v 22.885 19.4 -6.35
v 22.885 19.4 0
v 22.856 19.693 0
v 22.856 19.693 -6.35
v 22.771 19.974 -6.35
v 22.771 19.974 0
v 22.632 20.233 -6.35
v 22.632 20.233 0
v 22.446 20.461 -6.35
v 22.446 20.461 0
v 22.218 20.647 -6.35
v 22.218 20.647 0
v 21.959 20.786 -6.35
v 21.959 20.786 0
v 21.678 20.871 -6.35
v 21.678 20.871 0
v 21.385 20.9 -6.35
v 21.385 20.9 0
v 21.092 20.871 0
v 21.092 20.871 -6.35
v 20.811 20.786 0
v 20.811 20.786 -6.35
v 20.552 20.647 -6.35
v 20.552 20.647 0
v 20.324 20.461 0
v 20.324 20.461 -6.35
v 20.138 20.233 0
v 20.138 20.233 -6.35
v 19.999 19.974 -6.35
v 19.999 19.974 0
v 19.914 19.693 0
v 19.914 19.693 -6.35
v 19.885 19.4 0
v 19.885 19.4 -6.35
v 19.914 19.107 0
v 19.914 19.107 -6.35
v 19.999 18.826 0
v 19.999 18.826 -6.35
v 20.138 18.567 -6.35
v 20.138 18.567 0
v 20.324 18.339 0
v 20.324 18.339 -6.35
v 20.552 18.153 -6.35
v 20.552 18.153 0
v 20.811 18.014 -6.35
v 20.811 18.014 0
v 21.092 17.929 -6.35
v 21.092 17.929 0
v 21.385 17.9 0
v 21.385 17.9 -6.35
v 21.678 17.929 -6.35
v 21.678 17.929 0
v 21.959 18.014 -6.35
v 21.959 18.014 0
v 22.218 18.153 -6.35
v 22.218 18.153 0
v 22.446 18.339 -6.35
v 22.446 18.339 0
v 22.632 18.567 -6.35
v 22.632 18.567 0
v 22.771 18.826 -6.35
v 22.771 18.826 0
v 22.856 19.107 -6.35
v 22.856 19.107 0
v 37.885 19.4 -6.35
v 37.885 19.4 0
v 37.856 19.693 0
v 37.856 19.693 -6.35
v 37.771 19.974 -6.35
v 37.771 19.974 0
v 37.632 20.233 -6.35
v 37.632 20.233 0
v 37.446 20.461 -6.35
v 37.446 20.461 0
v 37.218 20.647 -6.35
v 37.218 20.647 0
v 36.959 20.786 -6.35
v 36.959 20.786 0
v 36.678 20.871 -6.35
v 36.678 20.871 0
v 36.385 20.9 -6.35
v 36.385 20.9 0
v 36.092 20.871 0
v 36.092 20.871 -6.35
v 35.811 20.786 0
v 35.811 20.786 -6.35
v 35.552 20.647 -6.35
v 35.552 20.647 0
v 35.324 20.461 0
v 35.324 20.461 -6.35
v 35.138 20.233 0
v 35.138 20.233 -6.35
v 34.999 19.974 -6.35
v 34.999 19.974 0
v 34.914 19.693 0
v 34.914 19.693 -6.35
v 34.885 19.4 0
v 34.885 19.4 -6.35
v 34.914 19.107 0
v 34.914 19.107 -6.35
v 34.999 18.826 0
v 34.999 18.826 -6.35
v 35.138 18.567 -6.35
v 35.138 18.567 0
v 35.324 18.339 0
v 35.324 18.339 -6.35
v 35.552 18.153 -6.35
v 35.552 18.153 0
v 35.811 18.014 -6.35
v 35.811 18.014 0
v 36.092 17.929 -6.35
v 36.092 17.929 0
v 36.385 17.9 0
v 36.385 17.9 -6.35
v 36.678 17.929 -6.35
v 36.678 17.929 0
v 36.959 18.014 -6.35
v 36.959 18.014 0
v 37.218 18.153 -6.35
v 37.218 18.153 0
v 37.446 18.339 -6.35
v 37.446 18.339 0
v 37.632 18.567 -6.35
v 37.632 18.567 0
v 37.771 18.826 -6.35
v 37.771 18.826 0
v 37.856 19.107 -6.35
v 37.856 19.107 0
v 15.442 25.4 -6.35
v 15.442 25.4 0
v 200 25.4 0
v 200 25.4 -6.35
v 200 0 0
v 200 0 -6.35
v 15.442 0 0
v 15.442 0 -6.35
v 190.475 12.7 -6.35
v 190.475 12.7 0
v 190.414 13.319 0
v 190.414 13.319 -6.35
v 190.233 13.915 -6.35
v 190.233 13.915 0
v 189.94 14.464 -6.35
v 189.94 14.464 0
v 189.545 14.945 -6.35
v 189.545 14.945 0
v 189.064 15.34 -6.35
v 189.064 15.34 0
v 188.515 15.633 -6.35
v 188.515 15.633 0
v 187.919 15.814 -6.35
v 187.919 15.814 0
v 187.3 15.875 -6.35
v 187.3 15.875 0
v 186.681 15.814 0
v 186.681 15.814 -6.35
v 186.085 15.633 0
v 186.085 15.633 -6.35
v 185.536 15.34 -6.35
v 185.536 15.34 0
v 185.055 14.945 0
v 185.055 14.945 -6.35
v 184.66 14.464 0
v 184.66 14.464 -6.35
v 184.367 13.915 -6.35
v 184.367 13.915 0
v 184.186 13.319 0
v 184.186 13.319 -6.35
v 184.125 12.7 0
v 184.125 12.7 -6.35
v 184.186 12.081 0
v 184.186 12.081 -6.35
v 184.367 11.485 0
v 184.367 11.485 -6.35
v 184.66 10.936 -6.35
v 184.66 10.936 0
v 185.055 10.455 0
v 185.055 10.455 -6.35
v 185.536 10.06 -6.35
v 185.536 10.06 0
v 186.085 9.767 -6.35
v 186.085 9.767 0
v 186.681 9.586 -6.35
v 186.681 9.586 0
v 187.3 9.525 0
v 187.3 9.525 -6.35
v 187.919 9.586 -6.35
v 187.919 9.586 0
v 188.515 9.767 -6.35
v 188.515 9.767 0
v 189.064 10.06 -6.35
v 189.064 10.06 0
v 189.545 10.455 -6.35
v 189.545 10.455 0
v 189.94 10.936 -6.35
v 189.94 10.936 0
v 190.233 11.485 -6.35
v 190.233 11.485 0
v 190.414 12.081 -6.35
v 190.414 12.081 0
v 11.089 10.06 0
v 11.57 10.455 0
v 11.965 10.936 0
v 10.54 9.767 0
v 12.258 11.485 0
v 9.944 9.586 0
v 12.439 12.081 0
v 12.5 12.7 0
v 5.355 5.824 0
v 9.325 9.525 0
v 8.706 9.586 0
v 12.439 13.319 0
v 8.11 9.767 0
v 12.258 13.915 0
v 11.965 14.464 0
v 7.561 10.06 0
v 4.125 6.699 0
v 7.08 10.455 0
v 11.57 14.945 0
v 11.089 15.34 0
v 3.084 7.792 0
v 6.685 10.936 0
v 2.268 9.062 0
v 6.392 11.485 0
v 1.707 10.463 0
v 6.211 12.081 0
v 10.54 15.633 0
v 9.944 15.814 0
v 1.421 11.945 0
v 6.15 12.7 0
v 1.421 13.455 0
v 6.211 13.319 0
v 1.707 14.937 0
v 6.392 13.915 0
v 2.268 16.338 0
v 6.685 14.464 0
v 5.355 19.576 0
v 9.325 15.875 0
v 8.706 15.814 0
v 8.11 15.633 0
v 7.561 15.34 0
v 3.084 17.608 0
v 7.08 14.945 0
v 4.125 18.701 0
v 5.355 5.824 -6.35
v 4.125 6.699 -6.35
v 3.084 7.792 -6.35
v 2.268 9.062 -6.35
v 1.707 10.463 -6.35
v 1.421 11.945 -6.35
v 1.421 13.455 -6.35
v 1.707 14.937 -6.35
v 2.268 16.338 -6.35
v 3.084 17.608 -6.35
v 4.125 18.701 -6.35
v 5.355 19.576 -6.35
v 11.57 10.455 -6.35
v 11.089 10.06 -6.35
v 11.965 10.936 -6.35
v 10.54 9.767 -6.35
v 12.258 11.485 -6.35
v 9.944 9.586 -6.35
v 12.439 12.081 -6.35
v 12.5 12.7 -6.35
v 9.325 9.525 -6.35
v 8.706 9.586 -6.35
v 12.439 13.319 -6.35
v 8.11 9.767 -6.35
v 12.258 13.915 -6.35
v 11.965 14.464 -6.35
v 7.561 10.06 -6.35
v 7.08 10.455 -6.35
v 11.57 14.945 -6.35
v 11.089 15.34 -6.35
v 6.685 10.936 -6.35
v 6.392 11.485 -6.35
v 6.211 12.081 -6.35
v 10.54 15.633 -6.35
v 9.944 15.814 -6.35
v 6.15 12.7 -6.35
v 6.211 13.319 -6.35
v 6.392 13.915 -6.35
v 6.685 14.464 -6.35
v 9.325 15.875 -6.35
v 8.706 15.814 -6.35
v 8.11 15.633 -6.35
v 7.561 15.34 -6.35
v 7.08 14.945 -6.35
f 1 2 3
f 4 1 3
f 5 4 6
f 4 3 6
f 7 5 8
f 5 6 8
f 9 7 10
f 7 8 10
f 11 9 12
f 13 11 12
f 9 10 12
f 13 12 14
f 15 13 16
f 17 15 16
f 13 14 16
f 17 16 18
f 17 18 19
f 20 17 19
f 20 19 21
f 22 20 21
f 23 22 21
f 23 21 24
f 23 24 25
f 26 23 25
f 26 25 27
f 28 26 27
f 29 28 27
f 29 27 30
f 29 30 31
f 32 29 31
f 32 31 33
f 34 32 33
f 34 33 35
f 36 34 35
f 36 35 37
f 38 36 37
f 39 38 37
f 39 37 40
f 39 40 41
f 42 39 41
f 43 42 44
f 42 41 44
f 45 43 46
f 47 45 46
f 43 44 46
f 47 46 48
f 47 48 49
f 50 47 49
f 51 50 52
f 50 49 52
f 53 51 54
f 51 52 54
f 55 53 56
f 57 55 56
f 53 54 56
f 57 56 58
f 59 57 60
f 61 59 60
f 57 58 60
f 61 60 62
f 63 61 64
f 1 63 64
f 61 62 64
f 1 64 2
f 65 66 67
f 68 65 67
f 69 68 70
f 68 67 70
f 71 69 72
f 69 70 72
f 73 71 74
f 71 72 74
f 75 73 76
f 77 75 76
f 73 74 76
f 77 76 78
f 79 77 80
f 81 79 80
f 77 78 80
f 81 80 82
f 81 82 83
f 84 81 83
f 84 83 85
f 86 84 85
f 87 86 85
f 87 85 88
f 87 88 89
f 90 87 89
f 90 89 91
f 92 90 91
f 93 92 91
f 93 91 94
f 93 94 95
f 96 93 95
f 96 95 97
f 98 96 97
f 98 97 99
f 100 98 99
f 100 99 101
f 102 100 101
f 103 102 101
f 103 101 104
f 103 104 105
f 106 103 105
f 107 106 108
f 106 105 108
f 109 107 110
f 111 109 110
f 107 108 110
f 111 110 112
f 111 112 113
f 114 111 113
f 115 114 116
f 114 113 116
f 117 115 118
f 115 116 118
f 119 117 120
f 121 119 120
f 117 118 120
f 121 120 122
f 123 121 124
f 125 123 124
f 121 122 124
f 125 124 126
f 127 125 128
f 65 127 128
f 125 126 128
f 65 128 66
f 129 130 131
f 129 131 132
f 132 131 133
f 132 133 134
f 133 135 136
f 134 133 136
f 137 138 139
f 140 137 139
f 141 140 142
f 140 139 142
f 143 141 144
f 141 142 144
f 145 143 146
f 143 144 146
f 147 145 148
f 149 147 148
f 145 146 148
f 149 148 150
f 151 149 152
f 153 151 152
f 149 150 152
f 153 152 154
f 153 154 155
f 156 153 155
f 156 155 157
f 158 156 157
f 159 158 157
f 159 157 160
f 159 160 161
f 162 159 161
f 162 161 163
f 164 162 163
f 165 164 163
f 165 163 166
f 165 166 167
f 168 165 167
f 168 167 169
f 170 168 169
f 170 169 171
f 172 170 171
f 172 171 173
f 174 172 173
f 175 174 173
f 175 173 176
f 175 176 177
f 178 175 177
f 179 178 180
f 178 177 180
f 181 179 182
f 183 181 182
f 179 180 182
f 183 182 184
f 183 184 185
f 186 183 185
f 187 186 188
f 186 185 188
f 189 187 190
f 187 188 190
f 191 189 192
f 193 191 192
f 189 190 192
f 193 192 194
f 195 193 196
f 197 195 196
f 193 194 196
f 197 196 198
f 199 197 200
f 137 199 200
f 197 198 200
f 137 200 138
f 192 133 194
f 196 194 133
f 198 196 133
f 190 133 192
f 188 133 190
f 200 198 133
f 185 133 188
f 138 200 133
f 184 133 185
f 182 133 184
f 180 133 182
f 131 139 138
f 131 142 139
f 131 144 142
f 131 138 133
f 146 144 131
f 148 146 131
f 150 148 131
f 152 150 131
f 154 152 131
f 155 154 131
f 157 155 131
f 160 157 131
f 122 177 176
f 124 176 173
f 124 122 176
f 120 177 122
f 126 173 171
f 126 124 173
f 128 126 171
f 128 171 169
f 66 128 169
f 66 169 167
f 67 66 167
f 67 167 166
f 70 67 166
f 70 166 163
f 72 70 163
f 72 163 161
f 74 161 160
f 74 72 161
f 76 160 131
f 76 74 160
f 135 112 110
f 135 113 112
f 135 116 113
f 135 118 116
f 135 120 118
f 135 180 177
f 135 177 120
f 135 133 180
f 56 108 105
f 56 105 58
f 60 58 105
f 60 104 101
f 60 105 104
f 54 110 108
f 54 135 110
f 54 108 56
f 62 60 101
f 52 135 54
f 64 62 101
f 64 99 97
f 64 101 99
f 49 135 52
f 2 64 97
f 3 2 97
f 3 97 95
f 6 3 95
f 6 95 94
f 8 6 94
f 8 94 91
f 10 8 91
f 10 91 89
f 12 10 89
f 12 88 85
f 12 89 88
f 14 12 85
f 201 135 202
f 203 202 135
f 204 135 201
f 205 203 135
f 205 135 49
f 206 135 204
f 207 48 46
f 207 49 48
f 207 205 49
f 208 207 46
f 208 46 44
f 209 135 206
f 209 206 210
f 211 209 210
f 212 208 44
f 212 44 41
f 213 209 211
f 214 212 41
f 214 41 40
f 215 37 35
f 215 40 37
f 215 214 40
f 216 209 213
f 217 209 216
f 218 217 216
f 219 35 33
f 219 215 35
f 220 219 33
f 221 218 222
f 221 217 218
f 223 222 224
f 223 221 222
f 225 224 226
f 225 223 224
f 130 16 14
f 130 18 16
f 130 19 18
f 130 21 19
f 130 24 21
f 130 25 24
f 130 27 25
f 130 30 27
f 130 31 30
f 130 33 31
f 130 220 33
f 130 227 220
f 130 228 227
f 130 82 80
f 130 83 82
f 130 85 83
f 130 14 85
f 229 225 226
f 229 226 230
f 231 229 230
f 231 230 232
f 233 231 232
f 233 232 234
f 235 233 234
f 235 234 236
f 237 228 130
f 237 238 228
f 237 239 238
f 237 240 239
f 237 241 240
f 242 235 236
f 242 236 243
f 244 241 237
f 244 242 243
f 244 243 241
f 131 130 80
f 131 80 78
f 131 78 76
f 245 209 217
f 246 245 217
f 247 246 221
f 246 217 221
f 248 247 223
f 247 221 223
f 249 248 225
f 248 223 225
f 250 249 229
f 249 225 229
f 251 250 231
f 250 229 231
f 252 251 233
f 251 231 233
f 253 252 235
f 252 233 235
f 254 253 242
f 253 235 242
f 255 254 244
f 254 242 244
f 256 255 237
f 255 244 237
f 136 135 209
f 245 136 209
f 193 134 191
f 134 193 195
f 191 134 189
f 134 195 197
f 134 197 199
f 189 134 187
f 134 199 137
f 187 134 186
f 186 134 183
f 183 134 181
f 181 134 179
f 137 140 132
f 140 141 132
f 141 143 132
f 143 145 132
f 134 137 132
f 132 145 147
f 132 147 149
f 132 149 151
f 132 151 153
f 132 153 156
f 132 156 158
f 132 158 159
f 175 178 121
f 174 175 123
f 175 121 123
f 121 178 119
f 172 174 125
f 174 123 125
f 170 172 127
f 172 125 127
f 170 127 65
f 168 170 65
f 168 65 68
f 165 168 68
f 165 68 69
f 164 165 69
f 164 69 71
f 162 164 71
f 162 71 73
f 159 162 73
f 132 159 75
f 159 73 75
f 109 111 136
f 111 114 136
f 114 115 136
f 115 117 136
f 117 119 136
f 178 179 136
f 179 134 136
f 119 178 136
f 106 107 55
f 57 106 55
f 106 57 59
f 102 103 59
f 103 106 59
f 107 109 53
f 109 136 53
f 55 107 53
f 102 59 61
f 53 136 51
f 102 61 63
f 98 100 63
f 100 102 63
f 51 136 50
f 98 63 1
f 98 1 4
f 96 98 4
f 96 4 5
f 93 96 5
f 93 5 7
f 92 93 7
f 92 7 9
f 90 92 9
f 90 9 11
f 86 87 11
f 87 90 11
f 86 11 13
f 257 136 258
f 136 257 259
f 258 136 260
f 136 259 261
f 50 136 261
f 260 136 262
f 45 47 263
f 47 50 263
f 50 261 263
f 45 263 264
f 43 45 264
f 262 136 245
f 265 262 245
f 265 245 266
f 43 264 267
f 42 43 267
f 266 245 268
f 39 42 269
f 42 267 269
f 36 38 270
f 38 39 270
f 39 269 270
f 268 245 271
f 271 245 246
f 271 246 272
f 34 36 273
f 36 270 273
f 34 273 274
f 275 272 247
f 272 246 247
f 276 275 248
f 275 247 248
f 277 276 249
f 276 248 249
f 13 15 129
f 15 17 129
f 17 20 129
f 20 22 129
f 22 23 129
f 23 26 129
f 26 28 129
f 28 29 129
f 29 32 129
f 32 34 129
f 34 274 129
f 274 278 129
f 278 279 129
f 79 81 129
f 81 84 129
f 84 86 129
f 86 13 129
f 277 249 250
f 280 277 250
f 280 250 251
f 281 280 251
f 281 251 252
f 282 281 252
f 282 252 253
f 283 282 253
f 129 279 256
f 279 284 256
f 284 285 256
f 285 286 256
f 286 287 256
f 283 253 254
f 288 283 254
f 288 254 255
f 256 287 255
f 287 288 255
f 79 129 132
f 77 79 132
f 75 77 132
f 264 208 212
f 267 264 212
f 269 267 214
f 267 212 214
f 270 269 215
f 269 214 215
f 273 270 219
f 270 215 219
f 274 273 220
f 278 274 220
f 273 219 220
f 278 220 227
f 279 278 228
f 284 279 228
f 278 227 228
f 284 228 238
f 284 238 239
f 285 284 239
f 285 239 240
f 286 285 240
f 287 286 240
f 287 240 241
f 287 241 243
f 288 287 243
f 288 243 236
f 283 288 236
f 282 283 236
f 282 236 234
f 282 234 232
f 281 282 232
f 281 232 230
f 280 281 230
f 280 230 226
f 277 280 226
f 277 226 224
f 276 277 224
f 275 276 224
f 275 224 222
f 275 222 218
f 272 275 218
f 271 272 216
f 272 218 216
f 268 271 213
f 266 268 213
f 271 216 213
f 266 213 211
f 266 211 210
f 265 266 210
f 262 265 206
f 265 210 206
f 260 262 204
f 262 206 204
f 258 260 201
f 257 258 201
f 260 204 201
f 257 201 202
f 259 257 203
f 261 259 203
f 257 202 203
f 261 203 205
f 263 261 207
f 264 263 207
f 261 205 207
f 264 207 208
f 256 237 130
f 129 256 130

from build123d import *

# Parameters (mm, degrees)
SKETCH1_W           = 6.35
SKETCH1_H           = 25.4
BOSS_EXTRUDE1_DEPTH = 200
SKETCH2_R           = 3.175
CUT_EXTRUDE1_DEPTH  = 202.706426521
SKETCH3_R           = 3.175
CUT_EXTRUDE2_DEPTH  = 202.706426521
SKETCH6_R           = 1.5
CUT_EXTRUDE3_DEPTH  = 202.706426521


with BuildPart() as part:
    # Sketch1 → Boss-Extrude1 (new body)
    with BuildSketch(Plane(origin=(0, 0, 0), x_dir=(0, 0, -1), z_dir=(1, 0, 0))):
        with Locations((3.175, 12.7)):
            Rectangle(SKETCH1_W, SKETCH1_H)
    extrude(amount=BOSS_EXTRUDE1_DEPTH)

    # Sketch2 → Cut-Extrude1 (cut, through all)
    with BuildSketch(Plane.XY):
        with Locations((187.3, 12.7)):
            Circle(SKETCH2_R)
    extrude(amount=-CUT_EXTRUDE1_DEPTH, mode=Mode.SUBTRACT)

    # Sketch3 → Cut-Extrude2 (cut, through all)
    with BuildSketch(Plane.XY):
        with Locations((9.325, 12.7)):
            Circle(SKETCH3_R)
        with BuildLine():
            Line((15.442045256, 25.4), (-1, 25.4))
            Line((-1, 25.4), (-1, 0))
            Line((-1, 0), (15.442045256, 0))
            Line((15.442045256, 0), (5.354999675, 5.823758482))
            ThreePointArc((5.354999675, 5.823758482), (1.385, 12.7), (5.354999675, 19.576241518))
            Line((5.354999675, 19.576241518), (15.442045256, 25.4))
        make_face()
    extrude(amount=-CUT_EXTRUDE2_DEPTH, mode=Mode.SUBTRACT)

    # Sketch6 → Cut-Extrude3 (cut, through all)
    with BuildSketch(Plane.XY):
        with Locations((21.385, 19.4)):
            Circle(SKETCH6_R)
        with Locations((36.385, 19.4)):
            Circle(SKETCH6_R)
    extrude(amount=-CUT_EXTRUDE3_DEPTH, mode=Mode.SUBTRACT)


solid = part.part
